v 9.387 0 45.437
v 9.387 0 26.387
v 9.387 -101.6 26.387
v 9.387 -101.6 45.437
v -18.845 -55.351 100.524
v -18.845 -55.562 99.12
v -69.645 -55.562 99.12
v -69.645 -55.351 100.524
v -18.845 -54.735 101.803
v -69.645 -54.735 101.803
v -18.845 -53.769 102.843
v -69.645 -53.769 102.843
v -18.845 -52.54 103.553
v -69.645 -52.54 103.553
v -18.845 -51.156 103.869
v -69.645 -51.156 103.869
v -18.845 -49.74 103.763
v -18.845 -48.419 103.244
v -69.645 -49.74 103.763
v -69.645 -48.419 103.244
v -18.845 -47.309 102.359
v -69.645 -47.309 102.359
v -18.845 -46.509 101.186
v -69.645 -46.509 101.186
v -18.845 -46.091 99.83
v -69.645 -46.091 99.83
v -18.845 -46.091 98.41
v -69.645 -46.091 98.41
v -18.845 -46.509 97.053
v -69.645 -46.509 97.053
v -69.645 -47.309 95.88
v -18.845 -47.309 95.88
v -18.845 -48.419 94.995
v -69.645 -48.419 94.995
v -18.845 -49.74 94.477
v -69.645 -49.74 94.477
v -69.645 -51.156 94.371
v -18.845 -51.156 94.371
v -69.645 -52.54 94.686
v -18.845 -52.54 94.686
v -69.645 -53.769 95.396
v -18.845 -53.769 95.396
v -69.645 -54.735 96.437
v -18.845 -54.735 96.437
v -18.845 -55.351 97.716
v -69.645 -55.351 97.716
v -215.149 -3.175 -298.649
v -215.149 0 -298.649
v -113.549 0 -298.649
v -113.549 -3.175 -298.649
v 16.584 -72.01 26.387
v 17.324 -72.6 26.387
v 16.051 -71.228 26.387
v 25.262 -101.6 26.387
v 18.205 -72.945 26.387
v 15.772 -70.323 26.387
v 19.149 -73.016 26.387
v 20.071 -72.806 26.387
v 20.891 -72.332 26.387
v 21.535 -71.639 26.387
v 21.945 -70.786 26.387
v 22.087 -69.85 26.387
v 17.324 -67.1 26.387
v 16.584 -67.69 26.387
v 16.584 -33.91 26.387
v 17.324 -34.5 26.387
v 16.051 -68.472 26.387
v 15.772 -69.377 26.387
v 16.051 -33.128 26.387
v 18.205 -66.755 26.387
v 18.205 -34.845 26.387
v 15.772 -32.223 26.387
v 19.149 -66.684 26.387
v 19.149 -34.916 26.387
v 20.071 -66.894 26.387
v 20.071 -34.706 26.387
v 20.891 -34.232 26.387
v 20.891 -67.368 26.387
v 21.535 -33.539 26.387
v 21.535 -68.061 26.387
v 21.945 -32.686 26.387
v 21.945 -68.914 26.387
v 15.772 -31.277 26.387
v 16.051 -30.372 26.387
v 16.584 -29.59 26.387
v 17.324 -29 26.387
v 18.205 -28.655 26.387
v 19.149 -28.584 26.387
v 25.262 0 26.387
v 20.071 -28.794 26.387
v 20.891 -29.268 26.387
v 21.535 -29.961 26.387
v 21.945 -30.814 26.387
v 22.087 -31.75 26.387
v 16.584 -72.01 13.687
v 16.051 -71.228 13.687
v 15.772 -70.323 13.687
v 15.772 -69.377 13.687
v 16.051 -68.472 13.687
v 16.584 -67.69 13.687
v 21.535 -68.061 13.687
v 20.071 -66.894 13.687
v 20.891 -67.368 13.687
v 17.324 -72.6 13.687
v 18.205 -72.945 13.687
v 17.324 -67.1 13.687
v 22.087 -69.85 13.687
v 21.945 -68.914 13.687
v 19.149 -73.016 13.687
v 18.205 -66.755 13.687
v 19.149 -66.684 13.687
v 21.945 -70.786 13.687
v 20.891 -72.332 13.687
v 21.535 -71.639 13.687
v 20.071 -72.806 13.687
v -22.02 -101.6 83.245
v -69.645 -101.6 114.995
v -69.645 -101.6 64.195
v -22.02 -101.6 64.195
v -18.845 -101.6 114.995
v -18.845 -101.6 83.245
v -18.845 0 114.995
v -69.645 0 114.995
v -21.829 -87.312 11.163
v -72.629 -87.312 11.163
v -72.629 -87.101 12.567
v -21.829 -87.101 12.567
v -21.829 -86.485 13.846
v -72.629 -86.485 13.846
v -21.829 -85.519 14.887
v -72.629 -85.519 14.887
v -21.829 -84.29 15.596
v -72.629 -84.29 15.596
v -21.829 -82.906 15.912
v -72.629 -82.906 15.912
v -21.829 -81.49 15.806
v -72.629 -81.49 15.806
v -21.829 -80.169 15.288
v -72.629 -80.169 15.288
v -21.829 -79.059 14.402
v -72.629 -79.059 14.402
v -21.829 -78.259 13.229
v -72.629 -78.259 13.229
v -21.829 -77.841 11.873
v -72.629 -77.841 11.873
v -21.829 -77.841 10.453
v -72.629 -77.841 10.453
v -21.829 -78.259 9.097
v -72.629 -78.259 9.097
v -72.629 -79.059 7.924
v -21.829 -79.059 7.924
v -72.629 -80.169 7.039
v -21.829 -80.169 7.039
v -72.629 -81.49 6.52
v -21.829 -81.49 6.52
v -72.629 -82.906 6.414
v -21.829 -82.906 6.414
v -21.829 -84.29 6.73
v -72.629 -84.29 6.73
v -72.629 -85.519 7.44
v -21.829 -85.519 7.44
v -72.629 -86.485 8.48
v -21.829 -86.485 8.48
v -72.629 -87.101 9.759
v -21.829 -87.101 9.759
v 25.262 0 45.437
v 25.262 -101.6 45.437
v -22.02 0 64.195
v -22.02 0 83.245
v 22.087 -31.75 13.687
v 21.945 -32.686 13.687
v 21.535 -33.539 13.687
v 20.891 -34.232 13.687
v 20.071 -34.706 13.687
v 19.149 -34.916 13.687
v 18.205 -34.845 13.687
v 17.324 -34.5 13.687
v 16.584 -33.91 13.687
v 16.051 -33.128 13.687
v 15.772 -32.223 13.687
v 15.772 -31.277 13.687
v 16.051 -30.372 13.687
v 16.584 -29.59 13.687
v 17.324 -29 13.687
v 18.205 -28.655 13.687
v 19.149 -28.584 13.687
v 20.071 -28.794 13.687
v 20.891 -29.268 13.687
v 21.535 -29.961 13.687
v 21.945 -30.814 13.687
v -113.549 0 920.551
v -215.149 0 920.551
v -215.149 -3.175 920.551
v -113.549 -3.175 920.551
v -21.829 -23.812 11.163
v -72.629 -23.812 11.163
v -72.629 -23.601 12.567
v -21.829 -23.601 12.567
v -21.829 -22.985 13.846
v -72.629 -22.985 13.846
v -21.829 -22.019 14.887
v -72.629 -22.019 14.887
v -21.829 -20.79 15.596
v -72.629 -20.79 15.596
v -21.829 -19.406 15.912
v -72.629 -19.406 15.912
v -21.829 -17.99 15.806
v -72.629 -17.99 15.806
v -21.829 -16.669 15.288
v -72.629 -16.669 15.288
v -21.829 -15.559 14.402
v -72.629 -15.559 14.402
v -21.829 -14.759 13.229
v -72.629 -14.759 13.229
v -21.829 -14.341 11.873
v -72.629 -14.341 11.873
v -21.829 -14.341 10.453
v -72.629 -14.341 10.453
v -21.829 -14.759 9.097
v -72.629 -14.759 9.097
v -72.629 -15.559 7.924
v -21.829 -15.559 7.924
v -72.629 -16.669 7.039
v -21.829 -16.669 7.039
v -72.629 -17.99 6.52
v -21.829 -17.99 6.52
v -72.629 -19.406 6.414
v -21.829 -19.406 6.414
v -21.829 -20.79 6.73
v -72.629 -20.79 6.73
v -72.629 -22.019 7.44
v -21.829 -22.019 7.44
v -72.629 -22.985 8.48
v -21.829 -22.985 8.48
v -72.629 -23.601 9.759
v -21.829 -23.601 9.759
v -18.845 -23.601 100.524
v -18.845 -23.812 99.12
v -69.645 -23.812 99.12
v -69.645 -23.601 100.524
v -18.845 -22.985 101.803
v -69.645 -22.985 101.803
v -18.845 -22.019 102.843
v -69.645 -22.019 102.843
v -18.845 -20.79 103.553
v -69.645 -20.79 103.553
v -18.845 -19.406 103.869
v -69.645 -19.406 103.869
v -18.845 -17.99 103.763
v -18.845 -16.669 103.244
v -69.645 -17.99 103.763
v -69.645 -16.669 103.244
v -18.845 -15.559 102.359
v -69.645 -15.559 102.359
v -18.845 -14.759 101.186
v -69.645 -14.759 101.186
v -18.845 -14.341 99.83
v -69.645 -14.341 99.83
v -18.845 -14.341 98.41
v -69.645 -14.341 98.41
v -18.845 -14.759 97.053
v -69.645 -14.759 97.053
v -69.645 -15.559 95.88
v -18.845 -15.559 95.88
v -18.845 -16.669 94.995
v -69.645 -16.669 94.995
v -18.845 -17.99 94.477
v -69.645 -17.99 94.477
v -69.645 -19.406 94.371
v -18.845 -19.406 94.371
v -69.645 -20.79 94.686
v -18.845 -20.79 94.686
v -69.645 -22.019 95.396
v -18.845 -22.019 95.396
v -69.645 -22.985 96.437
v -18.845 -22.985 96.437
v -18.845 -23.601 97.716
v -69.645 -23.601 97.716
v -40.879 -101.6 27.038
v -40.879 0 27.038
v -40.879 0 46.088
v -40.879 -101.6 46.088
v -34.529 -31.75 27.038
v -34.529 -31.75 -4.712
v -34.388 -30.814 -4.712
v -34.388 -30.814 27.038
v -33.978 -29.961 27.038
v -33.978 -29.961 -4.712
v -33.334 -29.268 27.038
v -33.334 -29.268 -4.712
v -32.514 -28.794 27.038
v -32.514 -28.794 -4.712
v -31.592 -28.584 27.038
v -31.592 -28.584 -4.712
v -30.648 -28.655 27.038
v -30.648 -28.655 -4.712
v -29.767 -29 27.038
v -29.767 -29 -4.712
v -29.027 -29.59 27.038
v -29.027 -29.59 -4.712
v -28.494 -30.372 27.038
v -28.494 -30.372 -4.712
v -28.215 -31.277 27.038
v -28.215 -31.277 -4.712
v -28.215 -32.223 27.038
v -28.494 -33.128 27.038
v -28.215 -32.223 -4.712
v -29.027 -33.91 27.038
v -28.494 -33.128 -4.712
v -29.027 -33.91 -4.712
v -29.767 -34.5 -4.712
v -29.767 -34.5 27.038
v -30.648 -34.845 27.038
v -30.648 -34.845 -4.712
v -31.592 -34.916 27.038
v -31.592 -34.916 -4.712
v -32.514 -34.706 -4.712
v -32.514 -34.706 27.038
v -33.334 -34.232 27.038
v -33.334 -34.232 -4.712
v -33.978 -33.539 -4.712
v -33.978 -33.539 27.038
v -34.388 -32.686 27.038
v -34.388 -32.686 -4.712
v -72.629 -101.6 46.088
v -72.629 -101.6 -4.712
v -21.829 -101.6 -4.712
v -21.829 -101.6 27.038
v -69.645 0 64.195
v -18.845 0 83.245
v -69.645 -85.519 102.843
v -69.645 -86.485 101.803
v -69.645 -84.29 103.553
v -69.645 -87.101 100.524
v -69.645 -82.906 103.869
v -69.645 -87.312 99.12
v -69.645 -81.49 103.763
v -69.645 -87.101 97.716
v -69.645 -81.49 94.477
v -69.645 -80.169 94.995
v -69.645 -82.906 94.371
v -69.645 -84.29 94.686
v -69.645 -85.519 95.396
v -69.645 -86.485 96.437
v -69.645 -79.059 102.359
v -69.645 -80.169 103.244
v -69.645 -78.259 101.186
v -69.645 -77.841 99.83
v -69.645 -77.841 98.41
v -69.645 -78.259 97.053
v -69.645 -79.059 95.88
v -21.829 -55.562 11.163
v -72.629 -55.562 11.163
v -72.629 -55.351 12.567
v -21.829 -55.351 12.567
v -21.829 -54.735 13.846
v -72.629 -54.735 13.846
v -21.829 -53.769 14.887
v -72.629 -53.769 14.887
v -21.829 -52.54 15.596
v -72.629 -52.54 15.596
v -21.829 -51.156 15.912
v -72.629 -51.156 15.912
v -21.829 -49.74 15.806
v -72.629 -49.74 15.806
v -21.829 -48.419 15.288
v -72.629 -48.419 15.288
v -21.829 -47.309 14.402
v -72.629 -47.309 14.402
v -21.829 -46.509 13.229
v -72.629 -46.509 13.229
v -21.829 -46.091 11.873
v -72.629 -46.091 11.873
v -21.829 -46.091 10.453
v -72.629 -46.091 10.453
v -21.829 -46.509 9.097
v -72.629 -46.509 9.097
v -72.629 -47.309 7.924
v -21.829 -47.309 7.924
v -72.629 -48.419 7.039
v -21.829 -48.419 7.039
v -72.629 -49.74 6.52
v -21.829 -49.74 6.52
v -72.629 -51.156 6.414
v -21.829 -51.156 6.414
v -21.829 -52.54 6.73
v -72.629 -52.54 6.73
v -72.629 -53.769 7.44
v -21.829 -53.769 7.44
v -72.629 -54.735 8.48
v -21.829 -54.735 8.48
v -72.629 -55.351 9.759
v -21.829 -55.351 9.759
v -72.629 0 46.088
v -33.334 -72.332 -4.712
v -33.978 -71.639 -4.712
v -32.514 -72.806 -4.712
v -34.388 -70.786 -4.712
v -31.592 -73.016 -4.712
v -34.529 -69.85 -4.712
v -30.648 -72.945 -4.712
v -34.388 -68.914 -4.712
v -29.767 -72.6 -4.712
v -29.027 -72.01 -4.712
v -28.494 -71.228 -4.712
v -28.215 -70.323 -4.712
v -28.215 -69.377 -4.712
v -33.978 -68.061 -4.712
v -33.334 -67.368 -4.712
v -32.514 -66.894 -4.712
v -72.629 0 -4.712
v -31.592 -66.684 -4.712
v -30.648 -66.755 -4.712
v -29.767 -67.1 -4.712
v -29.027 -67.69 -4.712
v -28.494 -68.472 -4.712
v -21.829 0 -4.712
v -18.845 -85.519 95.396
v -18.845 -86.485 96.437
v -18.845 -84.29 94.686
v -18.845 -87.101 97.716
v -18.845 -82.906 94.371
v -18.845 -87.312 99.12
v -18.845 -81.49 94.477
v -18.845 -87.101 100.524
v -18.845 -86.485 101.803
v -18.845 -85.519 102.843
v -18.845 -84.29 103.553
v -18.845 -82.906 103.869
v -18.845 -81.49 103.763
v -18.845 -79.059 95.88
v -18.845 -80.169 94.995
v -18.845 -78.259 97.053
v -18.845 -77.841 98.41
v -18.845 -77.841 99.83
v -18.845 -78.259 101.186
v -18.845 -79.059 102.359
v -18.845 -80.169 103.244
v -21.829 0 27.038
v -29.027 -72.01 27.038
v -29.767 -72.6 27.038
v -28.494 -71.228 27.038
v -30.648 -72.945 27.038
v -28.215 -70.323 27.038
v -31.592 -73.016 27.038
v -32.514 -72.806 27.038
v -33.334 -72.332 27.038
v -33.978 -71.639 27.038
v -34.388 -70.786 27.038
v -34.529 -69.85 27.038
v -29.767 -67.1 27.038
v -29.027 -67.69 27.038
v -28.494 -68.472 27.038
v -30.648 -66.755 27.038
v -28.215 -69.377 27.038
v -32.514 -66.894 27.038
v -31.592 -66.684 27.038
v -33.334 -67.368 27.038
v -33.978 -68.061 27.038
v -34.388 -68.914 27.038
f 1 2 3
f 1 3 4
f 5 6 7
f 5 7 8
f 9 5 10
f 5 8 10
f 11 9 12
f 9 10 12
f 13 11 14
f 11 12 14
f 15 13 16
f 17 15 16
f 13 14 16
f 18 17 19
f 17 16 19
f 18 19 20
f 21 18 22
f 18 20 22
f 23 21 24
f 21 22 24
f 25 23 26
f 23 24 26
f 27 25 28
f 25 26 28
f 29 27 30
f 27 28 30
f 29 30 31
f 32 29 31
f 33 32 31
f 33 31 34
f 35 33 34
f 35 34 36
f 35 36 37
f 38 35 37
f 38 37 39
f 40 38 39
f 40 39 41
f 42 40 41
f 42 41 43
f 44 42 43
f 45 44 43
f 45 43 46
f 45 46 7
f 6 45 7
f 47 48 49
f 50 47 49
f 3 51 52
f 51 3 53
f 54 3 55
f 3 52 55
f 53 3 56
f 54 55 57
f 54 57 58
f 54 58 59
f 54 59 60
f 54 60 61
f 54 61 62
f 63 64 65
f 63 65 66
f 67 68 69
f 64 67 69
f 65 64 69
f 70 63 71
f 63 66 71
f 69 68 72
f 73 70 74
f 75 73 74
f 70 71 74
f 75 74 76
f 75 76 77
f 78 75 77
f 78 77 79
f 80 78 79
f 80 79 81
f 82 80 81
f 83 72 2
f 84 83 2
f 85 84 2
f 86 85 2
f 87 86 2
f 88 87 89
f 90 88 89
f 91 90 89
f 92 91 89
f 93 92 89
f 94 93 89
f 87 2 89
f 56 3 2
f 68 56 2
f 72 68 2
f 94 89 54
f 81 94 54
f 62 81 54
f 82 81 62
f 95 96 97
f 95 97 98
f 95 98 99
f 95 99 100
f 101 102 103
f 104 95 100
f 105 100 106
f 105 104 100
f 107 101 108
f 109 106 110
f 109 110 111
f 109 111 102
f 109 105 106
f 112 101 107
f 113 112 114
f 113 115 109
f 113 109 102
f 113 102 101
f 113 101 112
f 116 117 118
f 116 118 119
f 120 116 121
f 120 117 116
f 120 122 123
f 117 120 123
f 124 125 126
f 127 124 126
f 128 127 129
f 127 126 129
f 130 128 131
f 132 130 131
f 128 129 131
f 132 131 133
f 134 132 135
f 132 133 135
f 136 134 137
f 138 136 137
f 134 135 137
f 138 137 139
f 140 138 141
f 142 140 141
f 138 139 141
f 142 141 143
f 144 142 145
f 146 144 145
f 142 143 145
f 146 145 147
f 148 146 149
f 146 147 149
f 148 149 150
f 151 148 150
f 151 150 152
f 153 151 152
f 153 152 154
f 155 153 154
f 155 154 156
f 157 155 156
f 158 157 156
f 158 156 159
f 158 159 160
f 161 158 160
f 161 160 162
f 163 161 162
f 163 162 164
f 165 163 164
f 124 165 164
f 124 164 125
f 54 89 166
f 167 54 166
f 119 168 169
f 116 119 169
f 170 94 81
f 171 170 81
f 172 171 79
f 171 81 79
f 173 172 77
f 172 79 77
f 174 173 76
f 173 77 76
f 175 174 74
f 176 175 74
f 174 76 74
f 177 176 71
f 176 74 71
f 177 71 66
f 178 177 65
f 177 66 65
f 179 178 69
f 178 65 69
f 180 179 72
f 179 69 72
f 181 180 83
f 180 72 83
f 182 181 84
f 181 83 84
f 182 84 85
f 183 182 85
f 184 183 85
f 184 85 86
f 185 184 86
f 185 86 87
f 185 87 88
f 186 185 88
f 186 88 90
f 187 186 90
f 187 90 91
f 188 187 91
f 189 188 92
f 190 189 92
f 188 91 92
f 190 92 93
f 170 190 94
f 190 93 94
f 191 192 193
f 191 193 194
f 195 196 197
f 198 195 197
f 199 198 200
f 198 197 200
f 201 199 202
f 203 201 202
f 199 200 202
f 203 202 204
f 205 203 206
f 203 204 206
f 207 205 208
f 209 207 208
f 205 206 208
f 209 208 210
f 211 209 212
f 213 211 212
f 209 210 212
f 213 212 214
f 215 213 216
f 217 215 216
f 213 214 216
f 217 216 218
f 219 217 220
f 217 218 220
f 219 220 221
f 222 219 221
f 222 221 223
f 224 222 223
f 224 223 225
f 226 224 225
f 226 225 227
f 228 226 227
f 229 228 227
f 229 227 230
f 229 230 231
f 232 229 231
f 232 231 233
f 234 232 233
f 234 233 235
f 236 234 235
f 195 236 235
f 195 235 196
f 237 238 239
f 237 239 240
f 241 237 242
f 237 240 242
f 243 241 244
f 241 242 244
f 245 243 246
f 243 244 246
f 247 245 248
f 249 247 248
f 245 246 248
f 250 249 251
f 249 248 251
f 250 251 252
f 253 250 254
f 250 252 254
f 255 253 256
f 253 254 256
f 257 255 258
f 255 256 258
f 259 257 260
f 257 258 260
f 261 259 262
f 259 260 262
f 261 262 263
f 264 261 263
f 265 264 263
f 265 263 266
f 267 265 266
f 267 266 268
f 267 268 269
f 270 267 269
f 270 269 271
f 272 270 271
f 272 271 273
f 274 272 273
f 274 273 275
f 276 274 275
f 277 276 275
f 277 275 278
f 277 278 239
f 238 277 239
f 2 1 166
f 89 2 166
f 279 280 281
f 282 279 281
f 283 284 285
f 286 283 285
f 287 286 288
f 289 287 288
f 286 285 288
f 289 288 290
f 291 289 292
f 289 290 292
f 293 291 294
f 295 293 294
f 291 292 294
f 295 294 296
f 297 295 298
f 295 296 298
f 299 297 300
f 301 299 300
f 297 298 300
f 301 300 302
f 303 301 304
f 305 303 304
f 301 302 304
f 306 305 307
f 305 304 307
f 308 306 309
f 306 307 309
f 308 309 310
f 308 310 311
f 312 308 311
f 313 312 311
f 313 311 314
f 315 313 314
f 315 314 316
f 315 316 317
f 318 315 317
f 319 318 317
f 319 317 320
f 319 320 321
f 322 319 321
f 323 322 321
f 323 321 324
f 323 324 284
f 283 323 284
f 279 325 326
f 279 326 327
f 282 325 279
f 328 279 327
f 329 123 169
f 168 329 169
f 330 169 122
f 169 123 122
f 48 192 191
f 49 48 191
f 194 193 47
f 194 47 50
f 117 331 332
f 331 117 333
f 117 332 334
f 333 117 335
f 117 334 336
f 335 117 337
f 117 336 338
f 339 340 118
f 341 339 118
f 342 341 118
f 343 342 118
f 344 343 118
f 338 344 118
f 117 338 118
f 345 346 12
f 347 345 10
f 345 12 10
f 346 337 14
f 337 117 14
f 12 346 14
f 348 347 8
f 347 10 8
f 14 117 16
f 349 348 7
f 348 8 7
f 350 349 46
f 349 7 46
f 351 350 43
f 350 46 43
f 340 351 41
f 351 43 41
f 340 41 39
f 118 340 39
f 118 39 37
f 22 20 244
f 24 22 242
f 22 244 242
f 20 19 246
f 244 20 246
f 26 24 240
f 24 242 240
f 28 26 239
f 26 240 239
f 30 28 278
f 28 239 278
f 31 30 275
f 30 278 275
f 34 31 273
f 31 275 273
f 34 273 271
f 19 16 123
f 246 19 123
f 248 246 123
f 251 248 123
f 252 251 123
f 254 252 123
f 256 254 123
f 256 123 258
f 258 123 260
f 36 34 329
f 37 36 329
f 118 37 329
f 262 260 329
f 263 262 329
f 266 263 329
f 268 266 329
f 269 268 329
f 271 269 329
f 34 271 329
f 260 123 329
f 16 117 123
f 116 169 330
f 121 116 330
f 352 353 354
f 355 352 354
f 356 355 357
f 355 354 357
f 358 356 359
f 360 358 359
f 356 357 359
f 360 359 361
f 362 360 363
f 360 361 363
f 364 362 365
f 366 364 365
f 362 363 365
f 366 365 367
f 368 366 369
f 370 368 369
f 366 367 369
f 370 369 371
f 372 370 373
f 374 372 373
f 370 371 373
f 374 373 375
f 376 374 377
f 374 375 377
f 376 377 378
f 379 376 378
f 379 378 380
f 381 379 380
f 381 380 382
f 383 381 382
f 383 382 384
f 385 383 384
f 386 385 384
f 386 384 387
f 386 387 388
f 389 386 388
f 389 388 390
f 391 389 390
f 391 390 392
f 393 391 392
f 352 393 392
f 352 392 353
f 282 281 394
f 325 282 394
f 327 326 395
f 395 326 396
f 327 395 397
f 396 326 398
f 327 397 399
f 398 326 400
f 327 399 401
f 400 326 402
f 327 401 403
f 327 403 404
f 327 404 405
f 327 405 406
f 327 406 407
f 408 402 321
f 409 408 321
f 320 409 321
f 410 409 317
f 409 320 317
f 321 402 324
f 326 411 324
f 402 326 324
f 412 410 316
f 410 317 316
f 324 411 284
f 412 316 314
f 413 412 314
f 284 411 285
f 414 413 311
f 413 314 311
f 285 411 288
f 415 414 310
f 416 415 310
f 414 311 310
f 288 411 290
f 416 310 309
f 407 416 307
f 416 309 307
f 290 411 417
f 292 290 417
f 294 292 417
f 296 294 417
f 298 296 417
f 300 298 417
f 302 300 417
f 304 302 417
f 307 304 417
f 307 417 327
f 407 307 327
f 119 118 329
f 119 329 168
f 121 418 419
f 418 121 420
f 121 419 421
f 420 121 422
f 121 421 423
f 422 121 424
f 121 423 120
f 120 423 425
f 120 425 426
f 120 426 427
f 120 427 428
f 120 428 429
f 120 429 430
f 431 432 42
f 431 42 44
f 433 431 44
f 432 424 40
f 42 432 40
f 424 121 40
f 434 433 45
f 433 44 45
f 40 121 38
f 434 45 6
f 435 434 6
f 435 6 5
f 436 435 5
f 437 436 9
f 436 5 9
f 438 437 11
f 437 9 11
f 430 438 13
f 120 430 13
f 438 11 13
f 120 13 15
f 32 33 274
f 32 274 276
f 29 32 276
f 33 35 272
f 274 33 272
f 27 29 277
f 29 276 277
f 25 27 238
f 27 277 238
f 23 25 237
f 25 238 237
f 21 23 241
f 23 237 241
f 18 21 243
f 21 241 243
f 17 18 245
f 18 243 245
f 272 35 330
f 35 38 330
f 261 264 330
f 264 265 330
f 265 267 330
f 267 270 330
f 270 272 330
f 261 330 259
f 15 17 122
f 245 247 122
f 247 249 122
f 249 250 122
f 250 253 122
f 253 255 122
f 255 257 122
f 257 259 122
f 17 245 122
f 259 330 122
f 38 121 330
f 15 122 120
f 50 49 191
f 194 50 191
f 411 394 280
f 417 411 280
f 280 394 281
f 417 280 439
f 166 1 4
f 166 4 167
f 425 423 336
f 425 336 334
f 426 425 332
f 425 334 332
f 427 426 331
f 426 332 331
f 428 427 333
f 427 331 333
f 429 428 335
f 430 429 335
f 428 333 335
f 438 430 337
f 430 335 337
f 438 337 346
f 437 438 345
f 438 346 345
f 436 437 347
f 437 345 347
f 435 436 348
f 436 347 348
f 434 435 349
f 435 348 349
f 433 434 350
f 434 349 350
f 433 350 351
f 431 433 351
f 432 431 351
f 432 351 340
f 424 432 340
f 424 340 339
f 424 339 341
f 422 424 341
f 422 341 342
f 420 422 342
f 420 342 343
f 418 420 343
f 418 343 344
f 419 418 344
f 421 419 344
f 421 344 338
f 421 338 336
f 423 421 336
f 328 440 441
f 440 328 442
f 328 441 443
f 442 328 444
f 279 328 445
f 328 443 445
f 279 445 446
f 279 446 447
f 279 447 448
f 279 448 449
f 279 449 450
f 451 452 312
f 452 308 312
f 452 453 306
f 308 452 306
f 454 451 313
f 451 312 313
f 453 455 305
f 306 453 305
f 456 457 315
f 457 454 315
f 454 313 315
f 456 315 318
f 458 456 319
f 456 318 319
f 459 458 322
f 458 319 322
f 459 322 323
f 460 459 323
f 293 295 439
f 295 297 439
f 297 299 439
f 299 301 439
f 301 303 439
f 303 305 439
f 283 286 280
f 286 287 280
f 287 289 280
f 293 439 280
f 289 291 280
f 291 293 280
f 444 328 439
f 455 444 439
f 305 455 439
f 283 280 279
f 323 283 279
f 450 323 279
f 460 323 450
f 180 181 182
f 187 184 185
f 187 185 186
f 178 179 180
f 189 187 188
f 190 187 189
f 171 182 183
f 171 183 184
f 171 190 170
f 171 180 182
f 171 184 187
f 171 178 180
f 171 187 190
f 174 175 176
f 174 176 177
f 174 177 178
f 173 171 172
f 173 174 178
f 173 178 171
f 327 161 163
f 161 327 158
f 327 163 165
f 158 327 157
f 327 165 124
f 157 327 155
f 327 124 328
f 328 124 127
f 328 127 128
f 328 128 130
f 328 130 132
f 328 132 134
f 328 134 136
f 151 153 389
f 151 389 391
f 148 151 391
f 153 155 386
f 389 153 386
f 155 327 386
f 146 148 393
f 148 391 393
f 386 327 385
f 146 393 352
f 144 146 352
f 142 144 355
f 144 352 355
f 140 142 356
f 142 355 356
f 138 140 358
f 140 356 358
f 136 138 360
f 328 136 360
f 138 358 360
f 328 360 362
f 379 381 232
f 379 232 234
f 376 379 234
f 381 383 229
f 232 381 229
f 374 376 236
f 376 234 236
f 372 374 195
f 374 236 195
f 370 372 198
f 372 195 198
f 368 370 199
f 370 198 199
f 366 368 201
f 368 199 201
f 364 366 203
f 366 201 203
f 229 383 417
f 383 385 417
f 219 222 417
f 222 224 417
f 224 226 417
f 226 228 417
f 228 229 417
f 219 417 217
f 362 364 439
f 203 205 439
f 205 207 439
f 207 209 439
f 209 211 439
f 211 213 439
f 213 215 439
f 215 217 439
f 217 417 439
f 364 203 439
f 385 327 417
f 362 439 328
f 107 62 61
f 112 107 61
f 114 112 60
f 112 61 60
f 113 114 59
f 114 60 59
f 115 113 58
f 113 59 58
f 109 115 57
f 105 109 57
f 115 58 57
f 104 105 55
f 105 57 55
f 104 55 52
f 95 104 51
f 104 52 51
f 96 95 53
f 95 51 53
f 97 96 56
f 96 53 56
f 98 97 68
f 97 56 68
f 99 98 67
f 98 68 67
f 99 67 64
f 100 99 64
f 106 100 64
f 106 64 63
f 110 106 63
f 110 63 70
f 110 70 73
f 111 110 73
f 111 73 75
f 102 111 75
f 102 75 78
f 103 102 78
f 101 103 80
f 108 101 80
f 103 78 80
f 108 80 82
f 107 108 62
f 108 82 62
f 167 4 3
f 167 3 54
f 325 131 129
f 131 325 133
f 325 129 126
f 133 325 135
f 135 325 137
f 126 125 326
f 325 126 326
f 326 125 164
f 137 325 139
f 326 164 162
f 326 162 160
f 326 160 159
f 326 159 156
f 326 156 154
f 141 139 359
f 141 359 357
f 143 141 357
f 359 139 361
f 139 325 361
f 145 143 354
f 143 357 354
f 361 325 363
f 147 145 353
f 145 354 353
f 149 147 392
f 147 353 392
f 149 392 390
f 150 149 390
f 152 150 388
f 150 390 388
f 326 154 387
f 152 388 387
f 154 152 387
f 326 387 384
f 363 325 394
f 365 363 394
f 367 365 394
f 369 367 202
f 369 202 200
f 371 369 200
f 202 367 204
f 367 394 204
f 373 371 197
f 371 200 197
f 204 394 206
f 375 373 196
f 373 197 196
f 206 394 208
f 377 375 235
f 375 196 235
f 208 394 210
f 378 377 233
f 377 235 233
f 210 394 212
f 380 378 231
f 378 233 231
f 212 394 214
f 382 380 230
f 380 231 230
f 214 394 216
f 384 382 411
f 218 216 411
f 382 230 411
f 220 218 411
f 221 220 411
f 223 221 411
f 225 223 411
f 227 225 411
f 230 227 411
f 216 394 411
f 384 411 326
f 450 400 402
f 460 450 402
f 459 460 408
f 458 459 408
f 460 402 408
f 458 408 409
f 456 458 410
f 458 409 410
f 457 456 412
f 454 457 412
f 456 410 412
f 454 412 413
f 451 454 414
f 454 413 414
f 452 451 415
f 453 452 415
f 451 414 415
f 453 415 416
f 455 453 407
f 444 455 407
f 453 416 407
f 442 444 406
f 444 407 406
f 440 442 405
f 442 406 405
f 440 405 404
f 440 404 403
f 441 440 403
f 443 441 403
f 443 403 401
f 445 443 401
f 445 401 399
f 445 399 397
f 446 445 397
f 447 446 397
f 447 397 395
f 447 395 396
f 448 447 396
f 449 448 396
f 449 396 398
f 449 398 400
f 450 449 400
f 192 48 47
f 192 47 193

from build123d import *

# Parameters (mm, degrees)
F1_DEPTH  = 101.6
F3_D      = 6.35
F5_D      = 9.525
F6_W      = 15.875
F6_H      = 19.05
F7_DEPTH  = 101.6
F8_R      = 3.175
F9_DEPTH  = 12.7
F11_DEPTH = 101.6
F13_D     = 9.525
F14_W     = 101.6
F14_H     = 1219.2
F15_DEPTH = 3.175


with BuildPart() as f1:
    # F0 (on Front) → F1 (new body)
    with BuildSketch(Plane.XZ):
        Polygon((-40.879235, 46.088122), (-72.629235, 46.088122), (-72.629235, -4.711878), (-21.829235, -4.711878), (-21.829235, 27.038122), (-40.879235, 27.038122), align=None)
    extrude(amount=F1_DEPTH)

    # F3 (through all)
    with Locations(Plane.XY.offset(27.038122)):
        with Locations((-31.354235, -69.85), (-31.354235, -31.75)):
            Hole(F3_D / 2)

    # F5 (through all)
    with Locations(Plane.YZ.offset(-21.829235)):
        with Locations((-82.55, 11.163122), (-50.8, 11.163122), (-19.05, 11.163122)):
            Hole(F5_D / 2)


with BuildPart() as f7:
    # F6 (on Front) → F7 (new body)
    with BuildSketch(Plane.XZ):
        with Locations((17.324004, 35.912496)):
            Rectangle(F6_W, F6_H)
    extrude(amount=F7_DEPTH)

    # F8 (on face) → F9 (join)
    with BuildSketch(Plane(origin=(0, 0, 26.387496), x_dir=(1, 0, 0), z_dir=(0, 0, -1))):
        with Locations((18.911504, 69.85)):
            Circle(F8_R)
        with Locations((18.911504, 31.75)):
            Circle(F8_R)
    extrude(amount=F9_DEPTH)


with BuildPart() as f11:
    # F10 (on Front) → F11 (new body)
    with BuildSketch(Plane.XZ):
        Polygon((-18.84457, 114.994766), (-69.64457, 114.994766), (-69.64457, 64.194766), (-22.01957, 64.194766), (-22.01957, 83.244766), (-18.84457, 83.244766), align=None)
    extrude(amount=F11_DEPTH)

    # F13 (through all)
    with Locations(Plane.YZ.offset(-18.84457)):
        with Locations((-82.55, 99.119766), (-50.8, 99.119766), (-19.05, 99.119766)):
            Hole(F13_D / 2)


with BuildPart() as f15:
    # F14 (on Front) → F15 (new body)
    with BuildSketch(Plane.XZ):
        with Locations((-164.348833, 310.951426)):
            Rectangle(F14_W, F14_H)
    extrude(amount=F15_DEPTH)


solid = Compound([f1.part, f7.part, f11.part, f15.part])
